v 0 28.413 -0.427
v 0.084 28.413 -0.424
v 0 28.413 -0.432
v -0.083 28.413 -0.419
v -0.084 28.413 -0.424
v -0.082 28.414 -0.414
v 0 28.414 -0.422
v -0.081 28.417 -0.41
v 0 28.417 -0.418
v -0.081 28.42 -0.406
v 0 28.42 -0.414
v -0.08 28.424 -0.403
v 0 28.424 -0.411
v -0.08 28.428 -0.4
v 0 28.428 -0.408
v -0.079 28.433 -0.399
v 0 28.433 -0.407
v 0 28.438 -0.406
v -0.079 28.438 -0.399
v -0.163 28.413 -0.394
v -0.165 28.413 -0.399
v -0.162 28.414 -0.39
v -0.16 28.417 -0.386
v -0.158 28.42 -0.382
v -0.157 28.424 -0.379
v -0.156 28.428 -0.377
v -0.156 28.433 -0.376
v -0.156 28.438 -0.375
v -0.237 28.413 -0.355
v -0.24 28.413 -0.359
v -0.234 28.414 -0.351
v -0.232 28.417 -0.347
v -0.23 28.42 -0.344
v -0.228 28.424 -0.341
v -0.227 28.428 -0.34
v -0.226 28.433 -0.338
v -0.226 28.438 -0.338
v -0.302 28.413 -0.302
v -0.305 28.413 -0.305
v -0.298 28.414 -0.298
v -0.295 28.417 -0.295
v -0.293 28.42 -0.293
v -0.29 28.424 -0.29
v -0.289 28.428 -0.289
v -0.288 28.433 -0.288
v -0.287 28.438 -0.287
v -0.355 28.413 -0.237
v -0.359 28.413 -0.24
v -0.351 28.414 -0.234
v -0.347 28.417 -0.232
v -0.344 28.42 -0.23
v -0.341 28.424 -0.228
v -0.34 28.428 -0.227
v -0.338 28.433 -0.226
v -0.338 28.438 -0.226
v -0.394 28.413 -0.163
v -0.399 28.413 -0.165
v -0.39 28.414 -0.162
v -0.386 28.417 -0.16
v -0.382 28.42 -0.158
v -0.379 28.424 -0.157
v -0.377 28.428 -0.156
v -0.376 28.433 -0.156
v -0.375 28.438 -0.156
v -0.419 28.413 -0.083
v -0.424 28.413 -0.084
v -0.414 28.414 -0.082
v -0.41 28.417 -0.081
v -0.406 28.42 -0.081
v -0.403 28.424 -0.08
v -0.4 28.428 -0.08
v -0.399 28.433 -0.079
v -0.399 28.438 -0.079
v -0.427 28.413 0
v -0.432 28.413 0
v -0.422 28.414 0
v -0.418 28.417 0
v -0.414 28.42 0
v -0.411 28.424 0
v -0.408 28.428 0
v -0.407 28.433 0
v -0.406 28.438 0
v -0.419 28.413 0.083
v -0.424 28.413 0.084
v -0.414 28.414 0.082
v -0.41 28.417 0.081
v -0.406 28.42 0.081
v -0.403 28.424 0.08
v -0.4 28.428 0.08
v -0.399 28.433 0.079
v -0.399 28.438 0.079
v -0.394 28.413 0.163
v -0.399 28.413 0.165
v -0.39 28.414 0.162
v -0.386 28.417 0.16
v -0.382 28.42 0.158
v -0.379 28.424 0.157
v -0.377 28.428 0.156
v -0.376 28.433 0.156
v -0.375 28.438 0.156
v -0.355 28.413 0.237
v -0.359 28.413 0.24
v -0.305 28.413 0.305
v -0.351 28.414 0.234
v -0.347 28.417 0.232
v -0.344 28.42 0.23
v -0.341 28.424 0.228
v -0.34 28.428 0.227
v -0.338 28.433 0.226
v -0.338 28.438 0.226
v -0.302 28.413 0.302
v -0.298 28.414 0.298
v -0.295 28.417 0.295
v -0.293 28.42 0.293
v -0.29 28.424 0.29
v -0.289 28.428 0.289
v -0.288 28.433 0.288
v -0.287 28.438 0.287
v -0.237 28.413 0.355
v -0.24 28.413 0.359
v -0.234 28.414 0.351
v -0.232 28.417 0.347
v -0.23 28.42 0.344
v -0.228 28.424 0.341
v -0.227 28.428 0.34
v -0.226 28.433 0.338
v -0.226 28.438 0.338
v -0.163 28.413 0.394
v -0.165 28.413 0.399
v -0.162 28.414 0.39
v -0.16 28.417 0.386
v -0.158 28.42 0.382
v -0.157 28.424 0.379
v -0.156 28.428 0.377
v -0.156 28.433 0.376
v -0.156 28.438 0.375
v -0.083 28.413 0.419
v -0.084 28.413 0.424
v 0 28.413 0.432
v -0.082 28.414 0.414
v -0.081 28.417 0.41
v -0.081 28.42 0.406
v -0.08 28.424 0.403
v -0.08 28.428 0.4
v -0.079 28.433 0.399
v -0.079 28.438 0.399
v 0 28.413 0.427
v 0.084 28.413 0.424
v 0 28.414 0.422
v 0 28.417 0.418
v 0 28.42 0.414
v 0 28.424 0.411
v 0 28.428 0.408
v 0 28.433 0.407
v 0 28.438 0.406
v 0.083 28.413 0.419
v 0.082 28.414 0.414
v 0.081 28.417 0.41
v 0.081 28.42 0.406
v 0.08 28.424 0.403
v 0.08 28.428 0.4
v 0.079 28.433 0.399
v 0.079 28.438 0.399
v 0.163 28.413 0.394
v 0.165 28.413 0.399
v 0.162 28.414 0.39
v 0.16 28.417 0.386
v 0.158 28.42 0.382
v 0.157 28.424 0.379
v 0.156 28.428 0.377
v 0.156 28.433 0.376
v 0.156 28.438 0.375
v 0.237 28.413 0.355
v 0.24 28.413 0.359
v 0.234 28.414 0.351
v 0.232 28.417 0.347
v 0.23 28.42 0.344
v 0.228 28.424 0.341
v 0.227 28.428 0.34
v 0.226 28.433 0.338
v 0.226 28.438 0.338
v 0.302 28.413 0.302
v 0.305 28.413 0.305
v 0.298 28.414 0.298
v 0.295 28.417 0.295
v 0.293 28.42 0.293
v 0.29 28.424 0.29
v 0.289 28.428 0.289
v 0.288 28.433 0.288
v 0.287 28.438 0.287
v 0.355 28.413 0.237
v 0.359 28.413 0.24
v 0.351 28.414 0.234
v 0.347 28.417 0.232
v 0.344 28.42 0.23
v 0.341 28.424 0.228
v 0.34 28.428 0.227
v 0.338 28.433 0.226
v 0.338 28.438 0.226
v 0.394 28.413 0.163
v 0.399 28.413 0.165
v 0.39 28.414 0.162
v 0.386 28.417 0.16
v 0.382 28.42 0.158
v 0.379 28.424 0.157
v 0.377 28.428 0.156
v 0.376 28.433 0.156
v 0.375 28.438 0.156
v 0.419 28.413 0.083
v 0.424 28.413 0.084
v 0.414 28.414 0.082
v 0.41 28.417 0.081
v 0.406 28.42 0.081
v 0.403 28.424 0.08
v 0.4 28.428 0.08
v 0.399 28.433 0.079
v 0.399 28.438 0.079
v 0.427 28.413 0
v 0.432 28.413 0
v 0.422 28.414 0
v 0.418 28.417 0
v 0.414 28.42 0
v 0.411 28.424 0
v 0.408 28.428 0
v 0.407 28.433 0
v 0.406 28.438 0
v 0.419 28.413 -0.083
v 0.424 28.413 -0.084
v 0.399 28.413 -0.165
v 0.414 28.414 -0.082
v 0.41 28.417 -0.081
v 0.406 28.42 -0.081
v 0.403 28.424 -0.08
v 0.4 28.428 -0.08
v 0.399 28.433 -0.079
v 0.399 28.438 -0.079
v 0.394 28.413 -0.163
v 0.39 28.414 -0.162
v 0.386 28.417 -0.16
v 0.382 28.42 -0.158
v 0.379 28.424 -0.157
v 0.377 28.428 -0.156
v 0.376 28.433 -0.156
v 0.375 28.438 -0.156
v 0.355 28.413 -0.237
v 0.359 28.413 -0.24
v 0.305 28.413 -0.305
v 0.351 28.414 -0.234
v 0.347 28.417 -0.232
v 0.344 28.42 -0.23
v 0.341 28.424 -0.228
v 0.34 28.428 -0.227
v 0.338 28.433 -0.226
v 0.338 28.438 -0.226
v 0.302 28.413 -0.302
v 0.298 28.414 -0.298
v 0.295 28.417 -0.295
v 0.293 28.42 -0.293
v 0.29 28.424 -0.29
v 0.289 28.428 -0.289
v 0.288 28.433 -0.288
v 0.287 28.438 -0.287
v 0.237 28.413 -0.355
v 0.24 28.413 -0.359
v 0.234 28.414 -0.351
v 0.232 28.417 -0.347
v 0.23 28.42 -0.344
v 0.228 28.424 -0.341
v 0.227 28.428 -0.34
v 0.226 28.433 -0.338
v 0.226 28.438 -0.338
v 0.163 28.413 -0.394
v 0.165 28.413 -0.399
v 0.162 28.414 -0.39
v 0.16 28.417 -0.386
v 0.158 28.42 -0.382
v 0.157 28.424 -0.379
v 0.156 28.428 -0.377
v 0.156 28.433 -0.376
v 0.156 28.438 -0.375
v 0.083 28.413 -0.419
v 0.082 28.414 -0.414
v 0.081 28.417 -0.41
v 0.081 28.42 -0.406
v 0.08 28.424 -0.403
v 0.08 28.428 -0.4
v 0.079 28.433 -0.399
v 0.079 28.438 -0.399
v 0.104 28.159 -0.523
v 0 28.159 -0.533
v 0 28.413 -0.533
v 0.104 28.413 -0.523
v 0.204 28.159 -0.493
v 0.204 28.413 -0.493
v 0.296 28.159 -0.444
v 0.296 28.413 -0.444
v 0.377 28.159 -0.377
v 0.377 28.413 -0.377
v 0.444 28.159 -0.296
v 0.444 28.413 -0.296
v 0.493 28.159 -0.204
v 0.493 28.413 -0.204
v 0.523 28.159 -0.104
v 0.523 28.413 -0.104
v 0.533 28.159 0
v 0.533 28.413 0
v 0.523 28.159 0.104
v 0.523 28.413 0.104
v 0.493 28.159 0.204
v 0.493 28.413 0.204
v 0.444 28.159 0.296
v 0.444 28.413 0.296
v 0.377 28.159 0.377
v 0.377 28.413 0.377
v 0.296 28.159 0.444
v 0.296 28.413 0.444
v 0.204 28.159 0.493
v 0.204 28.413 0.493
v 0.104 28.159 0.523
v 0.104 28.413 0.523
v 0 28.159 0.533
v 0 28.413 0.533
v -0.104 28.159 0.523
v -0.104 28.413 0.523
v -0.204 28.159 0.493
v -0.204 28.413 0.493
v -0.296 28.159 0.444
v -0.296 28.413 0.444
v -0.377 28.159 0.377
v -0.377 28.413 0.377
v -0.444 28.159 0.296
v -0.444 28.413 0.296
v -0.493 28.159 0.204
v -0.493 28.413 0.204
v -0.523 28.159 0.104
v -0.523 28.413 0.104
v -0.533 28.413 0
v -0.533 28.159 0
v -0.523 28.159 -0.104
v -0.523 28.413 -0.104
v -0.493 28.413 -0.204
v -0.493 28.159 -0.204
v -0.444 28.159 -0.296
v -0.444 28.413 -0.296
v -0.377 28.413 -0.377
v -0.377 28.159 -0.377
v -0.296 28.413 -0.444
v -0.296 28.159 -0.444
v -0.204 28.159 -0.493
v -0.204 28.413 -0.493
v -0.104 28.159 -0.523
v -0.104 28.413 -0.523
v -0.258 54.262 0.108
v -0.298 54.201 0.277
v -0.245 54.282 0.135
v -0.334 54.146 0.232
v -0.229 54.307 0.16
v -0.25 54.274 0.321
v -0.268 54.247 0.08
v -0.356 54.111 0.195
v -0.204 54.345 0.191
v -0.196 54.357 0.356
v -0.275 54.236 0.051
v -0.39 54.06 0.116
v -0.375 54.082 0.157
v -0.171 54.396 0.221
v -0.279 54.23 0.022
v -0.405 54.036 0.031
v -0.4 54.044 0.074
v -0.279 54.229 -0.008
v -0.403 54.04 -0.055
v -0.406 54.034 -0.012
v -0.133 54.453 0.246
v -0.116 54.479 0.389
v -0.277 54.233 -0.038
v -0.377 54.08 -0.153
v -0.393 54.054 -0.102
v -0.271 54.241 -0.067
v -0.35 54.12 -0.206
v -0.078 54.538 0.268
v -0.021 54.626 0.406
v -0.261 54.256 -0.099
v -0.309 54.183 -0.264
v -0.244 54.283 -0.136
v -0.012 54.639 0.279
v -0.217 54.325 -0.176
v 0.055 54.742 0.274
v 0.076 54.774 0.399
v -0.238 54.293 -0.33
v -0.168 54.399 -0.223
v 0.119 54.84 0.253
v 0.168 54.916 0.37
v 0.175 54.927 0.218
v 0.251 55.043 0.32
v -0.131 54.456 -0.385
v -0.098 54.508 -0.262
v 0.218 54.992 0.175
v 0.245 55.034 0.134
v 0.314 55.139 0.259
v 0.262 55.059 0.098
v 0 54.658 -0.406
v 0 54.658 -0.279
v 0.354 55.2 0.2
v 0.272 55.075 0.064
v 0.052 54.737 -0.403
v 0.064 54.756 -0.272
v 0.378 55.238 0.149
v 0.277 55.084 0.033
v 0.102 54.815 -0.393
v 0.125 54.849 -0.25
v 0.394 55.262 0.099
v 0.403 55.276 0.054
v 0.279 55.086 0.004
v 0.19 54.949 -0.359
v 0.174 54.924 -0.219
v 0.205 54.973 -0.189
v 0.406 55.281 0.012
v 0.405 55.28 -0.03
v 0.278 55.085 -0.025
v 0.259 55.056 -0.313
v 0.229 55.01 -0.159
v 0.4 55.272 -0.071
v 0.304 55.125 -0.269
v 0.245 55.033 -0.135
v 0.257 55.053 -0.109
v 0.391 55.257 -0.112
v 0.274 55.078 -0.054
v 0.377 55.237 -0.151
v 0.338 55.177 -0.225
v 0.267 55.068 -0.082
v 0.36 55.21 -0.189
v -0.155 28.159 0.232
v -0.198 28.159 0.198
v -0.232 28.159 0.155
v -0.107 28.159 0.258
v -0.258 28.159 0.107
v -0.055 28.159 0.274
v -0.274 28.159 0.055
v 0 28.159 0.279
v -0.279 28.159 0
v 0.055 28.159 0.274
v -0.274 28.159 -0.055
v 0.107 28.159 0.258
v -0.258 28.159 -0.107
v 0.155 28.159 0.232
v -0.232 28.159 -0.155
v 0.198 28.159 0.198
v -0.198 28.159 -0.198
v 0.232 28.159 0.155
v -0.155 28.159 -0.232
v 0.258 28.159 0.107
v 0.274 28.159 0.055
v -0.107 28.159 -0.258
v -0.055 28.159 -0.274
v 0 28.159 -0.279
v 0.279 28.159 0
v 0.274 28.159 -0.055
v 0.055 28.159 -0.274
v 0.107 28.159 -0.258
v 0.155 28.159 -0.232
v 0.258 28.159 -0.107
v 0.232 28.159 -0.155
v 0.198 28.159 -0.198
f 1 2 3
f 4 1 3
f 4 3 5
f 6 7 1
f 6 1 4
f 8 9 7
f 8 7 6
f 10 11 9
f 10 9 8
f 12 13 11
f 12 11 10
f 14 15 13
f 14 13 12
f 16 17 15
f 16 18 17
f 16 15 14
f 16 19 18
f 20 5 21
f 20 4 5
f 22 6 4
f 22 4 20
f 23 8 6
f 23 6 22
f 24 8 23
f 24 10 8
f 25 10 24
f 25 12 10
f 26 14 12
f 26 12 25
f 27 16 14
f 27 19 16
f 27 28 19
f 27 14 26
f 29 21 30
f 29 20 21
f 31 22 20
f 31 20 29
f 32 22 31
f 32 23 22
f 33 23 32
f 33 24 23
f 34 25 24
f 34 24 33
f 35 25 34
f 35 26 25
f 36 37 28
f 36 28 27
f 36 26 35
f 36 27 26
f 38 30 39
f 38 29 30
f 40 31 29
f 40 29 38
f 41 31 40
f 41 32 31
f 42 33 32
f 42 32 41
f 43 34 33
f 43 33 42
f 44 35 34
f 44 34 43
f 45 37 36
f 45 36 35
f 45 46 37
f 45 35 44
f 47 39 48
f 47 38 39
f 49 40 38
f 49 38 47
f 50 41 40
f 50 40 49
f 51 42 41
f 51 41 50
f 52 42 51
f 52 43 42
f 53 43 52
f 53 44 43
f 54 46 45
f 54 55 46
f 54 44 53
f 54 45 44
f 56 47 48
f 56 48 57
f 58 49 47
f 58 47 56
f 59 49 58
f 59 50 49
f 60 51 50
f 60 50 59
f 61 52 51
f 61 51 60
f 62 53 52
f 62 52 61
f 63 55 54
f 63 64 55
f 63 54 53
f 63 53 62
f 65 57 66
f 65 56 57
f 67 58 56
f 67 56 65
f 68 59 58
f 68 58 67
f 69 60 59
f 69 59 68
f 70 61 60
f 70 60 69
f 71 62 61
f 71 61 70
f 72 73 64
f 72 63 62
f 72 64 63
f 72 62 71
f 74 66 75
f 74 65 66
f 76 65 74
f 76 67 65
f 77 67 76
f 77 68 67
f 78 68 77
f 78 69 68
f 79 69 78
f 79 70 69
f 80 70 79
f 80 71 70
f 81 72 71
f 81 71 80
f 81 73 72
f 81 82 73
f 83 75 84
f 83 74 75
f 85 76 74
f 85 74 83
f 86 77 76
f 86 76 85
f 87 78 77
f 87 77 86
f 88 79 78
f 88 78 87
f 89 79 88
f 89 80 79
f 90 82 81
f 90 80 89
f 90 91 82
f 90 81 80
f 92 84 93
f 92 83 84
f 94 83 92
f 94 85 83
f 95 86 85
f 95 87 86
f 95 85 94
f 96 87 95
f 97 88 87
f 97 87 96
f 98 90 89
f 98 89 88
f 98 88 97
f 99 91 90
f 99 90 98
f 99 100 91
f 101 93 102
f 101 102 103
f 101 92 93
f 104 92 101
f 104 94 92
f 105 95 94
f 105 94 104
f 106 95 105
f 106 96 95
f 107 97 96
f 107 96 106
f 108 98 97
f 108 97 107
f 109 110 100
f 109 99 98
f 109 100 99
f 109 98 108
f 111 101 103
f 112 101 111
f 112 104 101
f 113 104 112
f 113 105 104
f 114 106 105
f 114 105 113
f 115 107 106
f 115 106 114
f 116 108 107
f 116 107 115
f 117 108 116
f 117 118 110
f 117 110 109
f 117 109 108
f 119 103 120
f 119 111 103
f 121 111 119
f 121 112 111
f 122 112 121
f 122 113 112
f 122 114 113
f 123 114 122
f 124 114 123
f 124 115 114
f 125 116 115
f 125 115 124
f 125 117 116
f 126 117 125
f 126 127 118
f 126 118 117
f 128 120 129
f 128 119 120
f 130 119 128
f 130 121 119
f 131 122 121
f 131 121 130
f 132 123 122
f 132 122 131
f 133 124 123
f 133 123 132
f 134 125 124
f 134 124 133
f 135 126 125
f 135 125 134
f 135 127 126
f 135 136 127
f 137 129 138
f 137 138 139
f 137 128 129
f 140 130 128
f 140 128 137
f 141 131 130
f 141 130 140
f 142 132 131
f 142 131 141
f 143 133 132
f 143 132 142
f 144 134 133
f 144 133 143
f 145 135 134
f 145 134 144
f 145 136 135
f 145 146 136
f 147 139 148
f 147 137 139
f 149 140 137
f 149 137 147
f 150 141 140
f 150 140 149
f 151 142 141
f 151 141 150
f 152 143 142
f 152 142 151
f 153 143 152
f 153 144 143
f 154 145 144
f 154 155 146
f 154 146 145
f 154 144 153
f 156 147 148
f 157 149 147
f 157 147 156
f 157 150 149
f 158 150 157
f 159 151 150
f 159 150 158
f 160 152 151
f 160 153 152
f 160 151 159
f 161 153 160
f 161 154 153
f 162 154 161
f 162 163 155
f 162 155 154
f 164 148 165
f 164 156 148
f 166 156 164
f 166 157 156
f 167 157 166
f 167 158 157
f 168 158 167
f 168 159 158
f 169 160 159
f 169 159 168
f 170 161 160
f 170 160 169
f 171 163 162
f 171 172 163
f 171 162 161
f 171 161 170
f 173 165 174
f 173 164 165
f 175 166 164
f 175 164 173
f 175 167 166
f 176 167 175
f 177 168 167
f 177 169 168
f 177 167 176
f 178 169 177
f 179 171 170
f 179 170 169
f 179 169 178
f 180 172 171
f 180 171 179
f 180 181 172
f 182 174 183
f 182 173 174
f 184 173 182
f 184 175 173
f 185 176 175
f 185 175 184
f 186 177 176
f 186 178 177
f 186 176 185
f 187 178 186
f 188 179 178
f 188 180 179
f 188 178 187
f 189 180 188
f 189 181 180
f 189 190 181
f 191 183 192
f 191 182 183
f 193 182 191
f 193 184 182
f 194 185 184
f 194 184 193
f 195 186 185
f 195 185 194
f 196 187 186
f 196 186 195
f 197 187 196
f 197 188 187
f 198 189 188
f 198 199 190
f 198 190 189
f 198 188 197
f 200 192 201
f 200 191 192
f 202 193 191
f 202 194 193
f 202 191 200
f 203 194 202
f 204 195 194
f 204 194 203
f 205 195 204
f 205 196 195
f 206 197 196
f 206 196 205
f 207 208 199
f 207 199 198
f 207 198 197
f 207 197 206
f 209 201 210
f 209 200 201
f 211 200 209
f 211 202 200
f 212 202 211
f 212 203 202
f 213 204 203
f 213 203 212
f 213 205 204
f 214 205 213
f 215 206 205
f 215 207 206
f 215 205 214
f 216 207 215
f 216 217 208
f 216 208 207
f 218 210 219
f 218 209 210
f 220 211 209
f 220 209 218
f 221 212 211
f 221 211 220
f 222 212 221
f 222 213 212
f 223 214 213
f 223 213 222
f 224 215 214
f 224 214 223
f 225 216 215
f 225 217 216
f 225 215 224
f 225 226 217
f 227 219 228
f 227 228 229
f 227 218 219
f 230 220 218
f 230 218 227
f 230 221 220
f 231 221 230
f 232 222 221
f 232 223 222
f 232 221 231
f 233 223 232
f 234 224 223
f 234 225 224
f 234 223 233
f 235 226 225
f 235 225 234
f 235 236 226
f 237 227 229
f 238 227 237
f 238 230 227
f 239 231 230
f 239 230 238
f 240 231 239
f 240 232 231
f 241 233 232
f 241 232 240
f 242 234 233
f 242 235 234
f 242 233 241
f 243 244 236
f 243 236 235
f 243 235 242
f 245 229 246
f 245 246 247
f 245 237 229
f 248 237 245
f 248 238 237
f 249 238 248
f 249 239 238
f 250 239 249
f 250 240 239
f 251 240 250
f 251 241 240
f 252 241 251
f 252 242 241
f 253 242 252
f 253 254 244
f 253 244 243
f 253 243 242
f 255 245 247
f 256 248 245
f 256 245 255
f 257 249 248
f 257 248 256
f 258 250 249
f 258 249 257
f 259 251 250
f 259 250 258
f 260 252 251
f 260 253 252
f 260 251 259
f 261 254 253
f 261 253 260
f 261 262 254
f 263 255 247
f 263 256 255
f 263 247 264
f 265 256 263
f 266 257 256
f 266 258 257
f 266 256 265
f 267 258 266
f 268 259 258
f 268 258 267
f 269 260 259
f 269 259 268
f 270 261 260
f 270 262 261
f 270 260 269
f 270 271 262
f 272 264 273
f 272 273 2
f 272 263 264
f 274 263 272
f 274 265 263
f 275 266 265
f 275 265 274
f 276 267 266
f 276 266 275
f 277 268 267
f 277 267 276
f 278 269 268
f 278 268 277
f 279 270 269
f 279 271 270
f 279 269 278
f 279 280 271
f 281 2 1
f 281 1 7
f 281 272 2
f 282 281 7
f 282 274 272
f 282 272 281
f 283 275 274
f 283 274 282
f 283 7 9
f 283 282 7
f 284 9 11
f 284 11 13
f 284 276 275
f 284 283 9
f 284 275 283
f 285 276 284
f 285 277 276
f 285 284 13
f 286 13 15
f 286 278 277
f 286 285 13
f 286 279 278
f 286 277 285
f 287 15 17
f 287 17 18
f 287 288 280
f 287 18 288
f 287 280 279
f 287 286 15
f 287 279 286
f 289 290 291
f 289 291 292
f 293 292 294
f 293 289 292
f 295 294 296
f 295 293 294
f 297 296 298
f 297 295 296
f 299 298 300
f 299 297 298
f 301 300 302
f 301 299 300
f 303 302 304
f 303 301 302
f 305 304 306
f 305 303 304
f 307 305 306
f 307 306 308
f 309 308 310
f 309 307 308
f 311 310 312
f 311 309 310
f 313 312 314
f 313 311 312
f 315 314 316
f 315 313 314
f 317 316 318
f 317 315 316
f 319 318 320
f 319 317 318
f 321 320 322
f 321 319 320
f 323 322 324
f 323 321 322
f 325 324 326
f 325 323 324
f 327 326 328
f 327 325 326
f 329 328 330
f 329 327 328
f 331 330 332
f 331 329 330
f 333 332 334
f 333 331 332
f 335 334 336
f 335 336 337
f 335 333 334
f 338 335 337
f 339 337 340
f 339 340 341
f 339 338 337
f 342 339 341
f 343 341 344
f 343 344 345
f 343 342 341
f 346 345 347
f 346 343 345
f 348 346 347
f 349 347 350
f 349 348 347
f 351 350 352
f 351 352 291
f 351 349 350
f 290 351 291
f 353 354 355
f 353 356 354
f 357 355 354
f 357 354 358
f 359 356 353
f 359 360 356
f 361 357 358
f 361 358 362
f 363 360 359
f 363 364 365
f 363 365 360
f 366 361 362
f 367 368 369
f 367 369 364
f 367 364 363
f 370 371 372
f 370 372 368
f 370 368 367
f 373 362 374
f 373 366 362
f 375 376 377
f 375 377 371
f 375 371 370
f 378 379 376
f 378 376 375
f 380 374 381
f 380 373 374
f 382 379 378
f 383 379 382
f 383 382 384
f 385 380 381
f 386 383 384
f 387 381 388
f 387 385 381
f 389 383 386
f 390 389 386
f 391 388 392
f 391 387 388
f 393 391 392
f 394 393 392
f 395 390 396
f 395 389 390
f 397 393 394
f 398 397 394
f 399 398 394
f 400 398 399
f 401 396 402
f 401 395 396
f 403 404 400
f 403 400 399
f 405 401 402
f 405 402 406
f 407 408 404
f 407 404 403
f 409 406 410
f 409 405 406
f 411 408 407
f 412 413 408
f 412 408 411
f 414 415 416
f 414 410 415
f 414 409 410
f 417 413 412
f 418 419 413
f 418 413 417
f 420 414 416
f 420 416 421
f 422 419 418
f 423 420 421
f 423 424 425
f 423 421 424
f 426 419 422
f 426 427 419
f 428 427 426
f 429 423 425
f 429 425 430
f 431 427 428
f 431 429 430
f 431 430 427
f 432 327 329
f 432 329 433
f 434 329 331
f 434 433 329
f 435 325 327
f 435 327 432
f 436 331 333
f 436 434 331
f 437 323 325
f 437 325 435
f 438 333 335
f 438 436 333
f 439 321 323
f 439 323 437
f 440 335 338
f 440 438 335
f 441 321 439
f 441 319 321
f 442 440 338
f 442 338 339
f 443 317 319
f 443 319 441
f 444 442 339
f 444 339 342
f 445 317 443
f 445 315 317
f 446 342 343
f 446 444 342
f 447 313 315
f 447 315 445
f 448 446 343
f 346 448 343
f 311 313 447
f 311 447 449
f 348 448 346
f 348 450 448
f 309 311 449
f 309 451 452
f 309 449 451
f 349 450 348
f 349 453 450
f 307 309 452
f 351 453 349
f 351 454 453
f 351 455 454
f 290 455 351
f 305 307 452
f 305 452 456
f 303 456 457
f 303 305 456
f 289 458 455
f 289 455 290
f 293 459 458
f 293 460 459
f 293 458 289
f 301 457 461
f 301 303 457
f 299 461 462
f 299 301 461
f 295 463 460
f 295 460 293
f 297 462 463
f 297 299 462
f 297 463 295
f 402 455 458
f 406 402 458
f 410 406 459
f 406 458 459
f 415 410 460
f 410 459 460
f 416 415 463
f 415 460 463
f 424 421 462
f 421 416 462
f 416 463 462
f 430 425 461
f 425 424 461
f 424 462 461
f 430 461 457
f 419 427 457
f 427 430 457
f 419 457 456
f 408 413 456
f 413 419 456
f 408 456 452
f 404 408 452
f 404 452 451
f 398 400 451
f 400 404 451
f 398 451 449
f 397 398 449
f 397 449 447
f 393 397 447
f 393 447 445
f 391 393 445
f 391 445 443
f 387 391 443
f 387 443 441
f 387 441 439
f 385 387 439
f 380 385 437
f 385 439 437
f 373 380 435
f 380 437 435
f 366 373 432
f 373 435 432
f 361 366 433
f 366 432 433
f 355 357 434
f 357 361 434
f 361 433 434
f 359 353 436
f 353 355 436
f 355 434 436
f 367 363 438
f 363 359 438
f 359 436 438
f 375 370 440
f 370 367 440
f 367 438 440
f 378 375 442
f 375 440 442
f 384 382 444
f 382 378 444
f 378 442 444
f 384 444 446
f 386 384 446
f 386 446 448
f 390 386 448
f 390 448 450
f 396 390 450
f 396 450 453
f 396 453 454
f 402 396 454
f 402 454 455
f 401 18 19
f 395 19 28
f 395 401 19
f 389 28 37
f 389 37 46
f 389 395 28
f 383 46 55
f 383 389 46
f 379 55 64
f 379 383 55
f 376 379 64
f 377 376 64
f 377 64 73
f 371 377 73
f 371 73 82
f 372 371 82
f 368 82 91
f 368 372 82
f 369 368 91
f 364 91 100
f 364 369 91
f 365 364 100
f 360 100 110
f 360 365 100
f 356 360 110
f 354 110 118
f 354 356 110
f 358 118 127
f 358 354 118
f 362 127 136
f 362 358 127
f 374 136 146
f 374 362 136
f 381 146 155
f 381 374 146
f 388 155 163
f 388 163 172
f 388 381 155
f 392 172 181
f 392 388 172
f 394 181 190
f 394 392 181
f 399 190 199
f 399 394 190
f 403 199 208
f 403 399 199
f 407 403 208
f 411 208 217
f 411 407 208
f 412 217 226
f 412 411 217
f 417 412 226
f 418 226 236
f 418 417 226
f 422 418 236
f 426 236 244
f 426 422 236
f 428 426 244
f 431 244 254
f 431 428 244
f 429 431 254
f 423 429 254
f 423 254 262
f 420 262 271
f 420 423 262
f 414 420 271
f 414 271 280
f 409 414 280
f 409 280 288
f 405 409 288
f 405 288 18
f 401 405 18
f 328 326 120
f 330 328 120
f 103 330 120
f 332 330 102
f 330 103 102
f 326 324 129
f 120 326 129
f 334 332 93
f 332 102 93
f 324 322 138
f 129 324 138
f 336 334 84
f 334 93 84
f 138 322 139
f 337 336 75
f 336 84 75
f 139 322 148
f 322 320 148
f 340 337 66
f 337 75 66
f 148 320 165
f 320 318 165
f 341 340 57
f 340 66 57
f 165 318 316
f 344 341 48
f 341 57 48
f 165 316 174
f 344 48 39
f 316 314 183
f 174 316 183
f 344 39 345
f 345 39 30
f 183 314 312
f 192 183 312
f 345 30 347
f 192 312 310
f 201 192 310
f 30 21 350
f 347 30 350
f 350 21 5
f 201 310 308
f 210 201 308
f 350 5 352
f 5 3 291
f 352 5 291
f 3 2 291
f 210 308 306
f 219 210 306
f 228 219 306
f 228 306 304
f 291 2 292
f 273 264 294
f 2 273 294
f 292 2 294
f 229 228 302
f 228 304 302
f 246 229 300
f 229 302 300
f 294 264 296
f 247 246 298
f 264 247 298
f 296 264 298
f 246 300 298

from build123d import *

# Parameters (mm, degrees)
SKETCH1_W               = 0.127
SKETCH1_H               = 27.075340428
CUT_EXTRUDE1_DEPTH      = 56.490859014
CUT_EXTRUDE1_DEPTH_BACK = 56.490859014
EXTRUDE1_START          = 0.254
SKETCH3_R               = 0.5334
SKETCH3_R_2             = 0.2794
EXTRUDE1_DEPTH          = 0.254
FILLET1_R               = 0.0254


with BuildPart() as part:
    # Sketch1 → Revolve-Thin1 (revolve)
    with BuildSketch(Plane.XY, mode=Mode.PRIVATE) as revolve_thin1_sk:
        with Locations((-0.3429, 41.950212357)):
            Rectangle(SKETCH1_W, SKETCH1_H)
    revolve(revolve_thin1_sk.sketch.rotate(Axis((0, 30.869098032, 0), (0, 1, 0)), 270), axis=Axis((0, 30.869098032, 0), (0, 1, 0)))

    # Sketch2 → Cut-Extrude1 (cut, two sides: drawn at the far end of the back side and taken through both)
    with BuildSketch(Plane.XY.offset(-CUT_EXTRUDE1_DEPTH_BACK)):
        Polygon((-39.853008345, -6.512099504), (-2.911484943, 50.188843392), (1.641018786, 57.176407255), (38.582542188, 113.877350151), (-74.819343604, 187.760396955), (-153.254894137, 67.3709473), align=None)
    extrude(amount=CUT_EXTRUDE1_DEPTH + CUT_EXTRUDE1_DEPTH_BACK, mode=Mode.SUBTRACT)

    # Sketch3 → Extrude1 (add)
    with BuildSketch(Plane.XZ.offset(-28.412542143).offset(EXTRUDE1_START)):
        with Locations(Location((0, 0, 0), (0, 0, 270))):
            Circle(SKETCH3_R)
        with Locations(Location((0, 0, 0), (0, 0, 270))):
            Circle(SKETCH3_R_2, mode=Mode.SUBTRACT)
    extrude(amount=-EXTRUDE1_DEPTH)

    # Fillet1
    fillet1_edges = [part.edges().sort_by_distance(p)[0] for p in [
        (0, 28.412542143, 0.4064),
    ]]
    fillet(fillet1_edges, radius=FILLET1_R)


solid = part.part
